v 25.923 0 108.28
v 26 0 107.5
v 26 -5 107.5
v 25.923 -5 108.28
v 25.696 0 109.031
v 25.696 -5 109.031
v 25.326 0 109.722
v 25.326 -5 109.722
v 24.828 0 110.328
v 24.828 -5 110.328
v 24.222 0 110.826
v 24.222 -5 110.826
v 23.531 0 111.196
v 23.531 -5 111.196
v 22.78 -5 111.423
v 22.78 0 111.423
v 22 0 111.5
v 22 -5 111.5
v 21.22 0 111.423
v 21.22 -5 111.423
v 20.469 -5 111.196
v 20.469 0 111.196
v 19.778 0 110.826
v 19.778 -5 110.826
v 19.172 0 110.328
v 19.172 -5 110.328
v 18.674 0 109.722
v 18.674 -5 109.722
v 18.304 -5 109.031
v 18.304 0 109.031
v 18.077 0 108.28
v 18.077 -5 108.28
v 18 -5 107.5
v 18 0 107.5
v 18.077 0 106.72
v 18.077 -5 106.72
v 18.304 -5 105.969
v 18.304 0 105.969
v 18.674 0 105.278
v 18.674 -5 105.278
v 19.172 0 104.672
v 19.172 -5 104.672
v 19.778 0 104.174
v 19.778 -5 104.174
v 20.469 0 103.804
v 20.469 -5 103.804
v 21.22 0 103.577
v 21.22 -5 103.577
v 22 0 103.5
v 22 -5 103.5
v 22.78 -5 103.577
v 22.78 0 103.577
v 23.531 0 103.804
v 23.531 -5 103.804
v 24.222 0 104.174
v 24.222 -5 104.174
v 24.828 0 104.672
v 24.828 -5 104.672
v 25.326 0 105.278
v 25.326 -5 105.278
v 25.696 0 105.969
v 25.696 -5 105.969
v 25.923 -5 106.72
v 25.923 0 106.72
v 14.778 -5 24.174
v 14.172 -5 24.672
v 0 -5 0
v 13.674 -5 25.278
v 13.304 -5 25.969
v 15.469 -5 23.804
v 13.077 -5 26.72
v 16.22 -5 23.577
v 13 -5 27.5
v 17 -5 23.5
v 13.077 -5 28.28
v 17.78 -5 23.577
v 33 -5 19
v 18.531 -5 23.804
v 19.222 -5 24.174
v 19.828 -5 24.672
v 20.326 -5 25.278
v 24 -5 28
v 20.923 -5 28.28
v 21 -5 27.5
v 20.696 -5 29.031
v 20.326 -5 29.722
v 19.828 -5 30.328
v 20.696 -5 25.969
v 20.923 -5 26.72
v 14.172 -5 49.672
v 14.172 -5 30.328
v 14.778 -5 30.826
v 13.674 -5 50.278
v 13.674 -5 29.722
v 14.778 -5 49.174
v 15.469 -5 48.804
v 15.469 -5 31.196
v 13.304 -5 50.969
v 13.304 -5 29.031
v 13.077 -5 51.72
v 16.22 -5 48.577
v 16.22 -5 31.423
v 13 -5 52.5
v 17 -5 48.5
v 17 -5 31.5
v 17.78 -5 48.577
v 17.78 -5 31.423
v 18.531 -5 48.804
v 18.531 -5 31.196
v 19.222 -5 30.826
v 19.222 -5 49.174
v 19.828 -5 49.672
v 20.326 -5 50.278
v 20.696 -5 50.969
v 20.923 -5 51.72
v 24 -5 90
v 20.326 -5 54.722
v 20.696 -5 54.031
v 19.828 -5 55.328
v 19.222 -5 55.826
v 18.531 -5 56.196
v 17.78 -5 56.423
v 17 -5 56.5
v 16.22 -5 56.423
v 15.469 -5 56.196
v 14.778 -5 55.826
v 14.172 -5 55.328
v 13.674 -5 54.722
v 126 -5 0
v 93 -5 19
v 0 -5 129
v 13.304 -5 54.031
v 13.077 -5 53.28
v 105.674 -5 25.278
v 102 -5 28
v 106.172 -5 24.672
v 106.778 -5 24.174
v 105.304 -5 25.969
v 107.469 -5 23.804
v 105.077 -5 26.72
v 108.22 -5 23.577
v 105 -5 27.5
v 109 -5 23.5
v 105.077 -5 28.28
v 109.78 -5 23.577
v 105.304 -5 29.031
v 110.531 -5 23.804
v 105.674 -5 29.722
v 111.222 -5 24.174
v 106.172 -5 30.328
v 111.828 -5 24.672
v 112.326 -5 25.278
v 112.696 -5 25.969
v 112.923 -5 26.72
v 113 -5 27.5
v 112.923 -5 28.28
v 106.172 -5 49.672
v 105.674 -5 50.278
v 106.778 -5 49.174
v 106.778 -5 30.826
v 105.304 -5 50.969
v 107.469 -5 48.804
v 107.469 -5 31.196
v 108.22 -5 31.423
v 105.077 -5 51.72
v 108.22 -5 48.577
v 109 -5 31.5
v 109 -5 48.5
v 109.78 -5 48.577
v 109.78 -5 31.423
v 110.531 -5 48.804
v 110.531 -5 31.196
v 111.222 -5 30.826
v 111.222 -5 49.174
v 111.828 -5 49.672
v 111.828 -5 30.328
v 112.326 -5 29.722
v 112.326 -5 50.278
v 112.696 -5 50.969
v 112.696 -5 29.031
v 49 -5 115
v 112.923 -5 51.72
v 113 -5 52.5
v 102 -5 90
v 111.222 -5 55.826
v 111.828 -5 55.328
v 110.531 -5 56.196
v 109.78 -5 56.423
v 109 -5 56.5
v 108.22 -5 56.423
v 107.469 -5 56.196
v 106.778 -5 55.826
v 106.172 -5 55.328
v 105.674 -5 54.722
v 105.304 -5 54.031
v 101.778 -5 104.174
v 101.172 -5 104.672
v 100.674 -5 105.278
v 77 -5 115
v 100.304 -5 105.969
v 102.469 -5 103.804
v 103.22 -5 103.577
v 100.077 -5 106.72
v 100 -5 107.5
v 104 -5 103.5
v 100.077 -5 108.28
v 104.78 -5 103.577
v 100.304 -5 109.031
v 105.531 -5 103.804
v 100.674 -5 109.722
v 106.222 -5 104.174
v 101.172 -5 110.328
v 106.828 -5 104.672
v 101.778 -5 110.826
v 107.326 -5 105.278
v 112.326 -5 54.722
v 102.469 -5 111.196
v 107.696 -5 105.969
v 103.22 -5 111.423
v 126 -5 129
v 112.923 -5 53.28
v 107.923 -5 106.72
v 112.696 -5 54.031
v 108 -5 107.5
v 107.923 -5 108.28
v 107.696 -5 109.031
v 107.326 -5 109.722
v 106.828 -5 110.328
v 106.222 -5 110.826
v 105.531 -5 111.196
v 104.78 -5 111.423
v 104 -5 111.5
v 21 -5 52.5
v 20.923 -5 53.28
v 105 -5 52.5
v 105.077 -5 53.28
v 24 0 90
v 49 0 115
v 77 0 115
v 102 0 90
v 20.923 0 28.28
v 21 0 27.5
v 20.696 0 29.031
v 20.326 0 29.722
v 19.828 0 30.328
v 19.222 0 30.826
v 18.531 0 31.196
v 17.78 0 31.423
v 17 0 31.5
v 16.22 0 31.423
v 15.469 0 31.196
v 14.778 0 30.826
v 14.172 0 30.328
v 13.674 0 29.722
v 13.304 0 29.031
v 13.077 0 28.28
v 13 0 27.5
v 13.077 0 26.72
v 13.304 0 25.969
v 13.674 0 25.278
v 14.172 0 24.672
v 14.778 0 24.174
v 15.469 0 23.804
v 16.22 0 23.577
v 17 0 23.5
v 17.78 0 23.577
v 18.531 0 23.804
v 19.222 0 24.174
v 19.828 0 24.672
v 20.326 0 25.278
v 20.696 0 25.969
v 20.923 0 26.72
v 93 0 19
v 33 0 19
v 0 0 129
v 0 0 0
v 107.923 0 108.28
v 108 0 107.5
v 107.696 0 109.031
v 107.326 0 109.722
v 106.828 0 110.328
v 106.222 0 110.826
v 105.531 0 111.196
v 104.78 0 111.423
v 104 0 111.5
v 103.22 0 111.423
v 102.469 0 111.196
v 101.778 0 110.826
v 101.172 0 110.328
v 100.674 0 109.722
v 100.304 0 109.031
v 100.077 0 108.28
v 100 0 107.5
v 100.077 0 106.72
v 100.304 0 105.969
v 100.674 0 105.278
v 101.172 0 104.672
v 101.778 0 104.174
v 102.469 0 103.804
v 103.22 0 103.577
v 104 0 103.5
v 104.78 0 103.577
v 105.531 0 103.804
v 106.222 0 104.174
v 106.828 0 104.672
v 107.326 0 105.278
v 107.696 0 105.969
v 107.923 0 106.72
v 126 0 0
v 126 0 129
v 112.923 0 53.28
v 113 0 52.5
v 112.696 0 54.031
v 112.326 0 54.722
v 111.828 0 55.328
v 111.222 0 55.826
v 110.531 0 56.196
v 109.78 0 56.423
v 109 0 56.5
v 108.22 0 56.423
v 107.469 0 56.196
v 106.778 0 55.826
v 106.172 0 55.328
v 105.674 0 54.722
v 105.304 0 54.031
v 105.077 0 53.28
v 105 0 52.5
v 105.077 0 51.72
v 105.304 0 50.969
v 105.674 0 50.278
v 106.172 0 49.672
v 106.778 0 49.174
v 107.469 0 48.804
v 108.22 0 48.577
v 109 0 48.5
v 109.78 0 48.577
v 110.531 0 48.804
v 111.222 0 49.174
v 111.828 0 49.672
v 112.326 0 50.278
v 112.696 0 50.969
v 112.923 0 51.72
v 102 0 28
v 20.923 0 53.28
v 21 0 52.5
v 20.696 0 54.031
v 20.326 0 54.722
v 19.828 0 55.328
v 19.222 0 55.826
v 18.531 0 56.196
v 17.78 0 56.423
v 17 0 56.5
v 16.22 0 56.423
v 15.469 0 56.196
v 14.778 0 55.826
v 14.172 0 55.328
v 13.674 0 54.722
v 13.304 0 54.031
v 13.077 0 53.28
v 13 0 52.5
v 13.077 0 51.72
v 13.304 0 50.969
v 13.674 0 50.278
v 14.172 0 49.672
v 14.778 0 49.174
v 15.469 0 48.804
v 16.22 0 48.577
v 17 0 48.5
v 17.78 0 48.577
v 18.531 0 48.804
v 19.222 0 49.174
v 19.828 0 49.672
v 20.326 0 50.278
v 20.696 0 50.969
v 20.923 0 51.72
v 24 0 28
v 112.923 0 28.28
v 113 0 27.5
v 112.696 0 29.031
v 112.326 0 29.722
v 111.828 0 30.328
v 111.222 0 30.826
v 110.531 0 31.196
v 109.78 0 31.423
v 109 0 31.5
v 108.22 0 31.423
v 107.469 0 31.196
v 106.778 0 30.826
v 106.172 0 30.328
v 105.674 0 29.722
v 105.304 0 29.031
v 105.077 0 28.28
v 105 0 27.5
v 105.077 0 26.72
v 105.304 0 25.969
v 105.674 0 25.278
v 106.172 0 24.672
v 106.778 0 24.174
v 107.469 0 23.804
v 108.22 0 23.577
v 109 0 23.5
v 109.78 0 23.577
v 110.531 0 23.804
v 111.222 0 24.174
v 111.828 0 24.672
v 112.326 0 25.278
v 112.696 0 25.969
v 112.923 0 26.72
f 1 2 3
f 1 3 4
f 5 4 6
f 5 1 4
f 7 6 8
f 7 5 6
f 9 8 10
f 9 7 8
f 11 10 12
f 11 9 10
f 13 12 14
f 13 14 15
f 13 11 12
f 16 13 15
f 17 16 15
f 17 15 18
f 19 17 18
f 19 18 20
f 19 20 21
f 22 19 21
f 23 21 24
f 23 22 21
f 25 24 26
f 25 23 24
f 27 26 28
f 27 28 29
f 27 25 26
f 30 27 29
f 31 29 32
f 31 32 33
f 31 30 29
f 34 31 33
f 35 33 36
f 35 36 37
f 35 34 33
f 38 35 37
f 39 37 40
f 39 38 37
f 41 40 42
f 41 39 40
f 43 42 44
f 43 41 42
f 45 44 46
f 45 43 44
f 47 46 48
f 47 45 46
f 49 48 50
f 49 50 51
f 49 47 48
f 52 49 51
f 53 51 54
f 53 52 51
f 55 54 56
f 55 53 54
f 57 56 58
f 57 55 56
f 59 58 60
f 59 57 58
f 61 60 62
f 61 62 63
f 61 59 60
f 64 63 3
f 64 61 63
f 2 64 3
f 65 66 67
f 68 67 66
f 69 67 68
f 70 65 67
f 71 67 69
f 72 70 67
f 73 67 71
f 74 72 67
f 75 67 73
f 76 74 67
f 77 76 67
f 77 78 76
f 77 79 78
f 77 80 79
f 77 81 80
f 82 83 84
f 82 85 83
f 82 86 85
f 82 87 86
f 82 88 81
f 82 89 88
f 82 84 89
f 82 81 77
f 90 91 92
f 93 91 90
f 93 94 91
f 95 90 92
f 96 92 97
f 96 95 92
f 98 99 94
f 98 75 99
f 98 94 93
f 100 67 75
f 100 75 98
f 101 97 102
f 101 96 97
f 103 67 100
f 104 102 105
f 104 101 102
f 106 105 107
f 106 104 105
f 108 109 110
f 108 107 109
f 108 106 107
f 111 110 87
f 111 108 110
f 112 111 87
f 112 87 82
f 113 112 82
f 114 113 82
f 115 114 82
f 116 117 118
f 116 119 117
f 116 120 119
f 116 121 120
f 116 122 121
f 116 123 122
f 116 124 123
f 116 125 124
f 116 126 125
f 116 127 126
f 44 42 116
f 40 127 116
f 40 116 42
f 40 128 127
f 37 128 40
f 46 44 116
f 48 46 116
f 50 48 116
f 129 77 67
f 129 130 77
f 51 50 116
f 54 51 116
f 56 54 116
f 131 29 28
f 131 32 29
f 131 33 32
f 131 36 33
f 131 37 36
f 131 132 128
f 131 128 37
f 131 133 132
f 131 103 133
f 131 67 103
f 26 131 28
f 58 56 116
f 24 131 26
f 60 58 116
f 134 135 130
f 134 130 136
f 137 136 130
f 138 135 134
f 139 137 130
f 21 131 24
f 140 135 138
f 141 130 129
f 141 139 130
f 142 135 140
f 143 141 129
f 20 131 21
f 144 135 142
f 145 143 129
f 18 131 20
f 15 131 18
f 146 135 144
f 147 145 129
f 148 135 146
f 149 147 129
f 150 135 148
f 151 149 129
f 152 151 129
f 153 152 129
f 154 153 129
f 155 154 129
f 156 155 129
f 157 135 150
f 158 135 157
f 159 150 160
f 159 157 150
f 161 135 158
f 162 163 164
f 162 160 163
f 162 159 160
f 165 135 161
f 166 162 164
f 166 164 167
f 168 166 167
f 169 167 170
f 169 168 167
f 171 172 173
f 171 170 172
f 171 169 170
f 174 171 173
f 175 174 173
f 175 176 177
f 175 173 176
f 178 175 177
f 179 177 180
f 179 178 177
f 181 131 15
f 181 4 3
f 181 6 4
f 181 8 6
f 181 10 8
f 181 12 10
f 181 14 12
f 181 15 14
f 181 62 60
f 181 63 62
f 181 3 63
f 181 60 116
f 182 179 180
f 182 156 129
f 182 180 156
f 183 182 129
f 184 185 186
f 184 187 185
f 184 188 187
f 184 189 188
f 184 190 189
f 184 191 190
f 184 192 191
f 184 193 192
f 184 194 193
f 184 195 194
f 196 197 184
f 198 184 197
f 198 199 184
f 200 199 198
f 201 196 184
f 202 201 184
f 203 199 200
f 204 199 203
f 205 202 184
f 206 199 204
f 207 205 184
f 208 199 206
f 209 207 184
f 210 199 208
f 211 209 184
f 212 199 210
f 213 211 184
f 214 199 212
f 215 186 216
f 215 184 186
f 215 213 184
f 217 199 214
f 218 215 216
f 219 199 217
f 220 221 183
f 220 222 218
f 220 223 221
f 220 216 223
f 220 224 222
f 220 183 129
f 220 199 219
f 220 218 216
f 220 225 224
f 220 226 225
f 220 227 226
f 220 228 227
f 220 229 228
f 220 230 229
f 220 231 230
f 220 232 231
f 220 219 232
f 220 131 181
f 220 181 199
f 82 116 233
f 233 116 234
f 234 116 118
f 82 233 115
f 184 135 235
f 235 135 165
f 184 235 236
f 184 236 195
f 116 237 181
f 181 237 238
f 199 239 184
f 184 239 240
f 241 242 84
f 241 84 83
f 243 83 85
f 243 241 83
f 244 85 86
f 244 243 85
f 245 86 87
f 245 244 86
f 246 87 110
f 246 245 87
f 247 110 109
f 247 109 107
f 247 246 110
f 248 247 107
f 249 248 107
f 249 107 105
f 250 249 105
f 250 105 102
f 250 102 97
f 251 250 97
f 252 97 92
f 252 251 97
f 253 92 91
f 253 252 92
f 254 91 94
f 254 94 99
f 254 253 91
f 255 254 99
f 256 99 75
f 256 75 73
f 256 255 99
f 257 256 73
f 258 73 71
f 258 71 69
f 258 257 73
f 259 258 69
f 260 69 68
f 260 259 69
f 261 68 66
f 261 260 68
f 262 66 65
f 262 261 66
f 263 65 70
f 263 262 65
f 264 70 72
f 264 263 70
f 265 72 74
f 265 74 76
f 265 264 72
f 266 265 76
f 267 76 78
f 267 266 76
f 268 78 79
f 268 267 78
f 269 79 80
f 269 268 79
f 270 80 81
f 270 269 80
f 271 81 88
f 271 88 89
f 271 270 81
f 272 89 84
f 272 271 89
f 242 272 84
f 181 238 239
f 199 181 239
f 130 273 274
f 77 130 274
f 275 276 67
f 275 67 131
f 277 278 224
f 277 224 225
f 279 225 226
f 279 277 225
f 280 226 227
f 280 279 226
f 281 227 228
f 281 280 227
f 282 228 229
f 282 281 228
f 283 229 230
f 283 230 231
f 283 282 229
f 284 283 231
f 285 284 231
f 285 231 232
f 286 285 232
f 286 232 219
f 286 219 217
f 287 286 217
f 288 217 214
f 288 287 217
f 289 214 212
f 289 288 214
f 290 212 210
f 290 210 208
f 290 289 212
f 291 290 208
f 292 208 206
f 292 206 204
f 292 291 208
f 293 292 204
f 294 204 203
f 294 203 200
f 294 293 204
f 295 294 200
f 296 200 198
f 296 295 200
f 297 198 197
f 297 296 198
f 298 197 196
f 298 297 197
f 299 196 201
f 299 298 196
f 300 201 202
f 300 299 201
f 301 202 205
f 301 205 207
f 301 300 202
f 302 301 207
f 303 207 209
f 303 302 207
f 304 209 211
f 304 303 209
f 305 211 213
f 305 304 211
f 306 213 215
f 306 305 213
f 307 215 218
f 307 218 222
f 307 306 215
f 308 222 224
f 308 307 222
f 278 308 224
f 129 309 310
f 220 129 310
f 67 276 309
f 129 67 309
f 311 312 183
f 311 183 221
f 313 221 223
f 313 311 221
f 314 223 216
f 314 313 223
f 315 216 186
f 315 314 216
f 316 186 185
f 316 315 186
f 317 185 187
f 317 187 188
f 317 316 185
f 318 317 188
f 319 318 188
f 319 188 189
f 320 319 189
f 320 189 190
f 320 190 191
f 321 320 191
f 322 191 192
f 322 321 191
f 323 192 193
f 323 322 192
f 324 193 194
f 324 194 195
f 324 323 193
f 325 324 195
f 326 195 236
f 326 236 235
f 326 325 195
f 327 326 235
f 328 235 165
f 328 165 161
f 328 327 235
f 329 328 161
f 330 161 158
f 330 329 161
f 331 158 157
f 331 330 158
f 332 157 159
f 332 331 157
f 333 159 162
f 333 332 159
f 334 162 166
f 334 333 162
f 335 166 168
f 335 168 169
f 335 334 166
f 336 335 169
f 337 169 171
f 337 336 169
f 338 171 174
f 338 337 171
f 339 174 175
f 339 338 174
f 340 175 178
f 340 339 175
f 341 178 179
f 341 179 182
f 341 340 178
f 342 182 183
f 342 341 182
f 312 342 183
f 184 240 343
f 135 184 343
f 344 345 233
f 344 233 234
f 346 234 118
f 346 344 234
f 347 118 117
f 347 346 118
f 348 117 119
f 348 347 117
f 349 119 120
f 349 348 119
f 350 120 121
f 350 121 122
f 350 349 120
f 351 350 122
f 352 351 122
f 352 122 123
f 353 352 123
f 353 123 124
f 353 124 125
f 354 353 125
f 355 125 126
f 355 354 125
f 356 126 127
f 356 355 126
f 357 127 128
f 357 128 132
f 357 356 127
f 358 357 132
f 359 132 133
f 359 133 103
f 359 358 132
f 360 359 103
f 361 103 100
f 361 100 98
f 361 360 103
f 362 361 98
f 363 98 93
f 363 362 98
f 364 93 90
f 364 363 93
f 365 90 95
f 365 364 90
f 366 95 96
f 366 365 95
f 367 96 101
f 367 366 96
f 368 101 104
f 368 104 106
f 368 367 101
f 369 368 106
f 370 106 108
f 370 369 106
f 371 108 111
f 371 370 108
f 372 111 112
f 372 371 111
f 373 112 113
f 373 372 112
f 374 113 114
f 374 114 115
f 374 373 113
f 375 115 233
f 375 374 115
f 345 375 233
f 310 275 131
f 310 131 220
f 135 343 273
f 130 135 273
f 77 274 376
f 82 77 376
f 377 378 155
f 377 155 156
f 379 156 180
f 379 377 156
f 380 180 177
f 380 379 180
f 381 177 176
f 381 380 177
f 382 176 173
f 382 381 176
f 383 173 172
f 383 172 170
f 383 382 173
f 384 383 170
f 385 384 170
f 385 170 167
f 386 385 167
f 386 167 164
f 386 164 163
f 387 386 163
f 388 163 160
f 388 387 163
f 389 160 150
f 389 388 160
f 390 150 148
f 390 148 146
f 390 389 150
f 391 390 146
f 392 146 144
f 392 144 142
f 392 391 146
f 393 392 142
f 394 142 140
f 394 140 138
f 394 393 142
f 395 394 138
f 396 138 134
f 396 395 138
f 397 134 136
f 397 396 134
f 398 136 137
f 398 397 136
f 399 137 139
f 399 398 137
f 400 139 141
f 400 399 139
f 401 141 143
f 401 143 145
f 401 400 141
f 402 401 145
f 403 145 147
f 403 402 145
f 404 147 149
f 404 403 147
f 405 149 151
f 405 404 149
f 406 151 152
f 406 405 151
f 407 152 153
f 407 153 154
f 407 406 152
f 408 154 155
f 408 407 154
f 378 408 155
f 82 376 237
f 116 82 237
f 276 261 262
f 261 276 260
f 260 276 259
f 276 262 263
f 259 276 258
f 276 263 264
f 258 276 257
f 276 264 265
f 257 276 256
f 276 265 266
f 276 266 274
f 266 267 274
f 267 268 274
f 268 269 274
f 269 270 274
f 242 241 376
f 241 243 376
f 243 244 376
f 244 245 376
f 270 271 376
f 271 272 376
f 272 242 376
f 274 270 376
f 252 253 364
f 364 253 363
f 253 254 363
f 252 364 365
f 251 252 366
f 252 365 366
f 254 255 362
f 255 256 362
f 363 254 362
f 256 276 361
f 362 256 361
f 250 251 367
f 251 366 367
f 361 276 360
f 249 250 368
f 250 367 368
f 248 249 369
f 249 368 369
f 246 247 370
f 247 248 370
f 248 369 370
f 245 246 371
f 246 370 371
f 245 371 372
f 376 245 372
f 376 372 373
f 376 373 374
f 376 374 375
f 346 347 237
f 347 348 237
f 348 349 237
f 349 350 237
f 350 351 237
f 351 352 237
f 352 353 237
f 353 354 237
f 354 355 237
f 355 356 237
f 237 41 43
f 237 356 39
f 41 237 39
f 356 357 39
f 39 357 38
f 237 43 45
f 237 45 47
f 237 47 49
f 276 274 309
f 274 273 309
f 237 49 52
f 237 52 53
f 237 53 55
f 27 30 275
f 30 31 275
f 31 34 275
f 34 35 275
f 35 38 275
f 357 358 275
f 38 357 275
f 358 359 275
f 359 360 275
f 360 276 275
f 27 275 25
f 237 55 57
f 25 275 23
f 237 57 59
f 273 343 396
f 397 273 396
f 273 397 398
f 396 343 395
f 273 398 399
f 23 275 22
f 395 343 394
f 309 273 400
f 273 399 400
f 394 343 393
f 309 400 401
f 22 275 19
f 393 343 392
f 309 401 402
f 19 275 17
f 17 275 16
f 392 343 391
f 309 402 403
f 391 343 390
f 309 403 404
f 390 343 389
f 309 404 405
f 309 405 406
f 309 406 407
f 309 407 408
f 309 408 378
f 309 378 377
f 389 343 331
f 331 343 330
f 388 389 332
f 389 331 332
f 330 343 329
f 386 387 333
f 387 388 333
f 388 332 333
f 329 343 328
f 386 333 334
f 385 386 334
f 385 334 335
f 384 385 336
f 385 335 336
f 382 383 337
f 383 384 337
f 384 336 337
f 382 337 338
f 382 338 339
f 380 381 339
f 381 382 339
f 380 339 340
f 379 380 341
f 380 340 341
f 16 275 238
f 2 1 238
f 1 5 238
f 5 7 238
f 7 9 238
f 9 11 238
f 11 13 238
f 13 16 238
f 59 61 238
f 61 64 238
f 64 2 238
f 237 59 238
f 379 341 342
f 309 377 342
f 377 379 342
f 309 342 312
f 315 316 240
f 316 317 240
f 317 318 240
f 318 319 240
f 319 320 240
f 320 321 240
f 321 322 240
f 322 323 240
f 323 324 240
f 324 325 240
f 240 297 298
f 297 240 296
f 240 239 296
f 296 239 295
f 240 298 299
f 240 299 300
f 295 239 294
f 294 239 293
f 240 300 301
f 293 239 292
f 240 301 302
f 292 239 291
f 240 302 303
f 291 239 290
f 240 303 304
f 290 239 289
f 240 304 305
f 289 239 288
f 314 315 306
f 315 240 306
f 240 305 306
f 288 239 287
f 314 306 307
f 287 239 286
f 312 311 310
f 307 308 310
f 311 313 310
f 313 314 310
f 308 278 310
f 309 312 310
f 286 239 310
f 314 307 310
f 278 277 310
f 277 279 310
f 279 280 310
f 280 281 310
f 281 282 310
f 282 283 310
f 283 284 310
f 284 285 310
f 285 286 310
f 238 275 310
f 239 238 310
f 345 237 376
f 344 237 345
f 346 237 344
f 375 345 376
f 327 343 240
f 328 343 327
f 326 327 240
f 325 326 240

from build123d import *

# Parameters (mm, degrees)
F0_W     = 126
F0_H     = 129
F0_R     = 4
F1_DEPTH = 5


with BuildPart() as f1:
    # F0 (on Front) → F1 (new body)
    with BuildSketch(Plane.XZ):
        with Locations((63, 64.5)):
            Rectangle(F0_W, F0_H)
        with Locations((17, 27.5)):
            Circle(F0_R, mode=Mode.SUBTRACT)
        with Locations((17, 52.5)):
            Circle(F0_R, mode=Mode.SUBTRACT)
        with Locations((109, 27.5)):
            Circle(F0_R, mode=Mode.SUBTRACT)
        with Locations((109, 52.5)):
            Circle(F0_R, mode=Mode.SUBTRACT)
        with Locations((22, 107.5)):
            Circle(F0_R, mode=Mode.SUBTRACT)
        Polygon((93, 19), (33, 19), (24, 28), (24, 90), (49, 115), (77, 115), (102, 90), (102, 28), align=None, mode=Mode.SUBTRACT)
        with Locations((104, 107.5)):
            Circle(F0_R, mode=Mode.SUBTRACT)
    extrude(amount=F1_DEPTH)


solid = f1.part
